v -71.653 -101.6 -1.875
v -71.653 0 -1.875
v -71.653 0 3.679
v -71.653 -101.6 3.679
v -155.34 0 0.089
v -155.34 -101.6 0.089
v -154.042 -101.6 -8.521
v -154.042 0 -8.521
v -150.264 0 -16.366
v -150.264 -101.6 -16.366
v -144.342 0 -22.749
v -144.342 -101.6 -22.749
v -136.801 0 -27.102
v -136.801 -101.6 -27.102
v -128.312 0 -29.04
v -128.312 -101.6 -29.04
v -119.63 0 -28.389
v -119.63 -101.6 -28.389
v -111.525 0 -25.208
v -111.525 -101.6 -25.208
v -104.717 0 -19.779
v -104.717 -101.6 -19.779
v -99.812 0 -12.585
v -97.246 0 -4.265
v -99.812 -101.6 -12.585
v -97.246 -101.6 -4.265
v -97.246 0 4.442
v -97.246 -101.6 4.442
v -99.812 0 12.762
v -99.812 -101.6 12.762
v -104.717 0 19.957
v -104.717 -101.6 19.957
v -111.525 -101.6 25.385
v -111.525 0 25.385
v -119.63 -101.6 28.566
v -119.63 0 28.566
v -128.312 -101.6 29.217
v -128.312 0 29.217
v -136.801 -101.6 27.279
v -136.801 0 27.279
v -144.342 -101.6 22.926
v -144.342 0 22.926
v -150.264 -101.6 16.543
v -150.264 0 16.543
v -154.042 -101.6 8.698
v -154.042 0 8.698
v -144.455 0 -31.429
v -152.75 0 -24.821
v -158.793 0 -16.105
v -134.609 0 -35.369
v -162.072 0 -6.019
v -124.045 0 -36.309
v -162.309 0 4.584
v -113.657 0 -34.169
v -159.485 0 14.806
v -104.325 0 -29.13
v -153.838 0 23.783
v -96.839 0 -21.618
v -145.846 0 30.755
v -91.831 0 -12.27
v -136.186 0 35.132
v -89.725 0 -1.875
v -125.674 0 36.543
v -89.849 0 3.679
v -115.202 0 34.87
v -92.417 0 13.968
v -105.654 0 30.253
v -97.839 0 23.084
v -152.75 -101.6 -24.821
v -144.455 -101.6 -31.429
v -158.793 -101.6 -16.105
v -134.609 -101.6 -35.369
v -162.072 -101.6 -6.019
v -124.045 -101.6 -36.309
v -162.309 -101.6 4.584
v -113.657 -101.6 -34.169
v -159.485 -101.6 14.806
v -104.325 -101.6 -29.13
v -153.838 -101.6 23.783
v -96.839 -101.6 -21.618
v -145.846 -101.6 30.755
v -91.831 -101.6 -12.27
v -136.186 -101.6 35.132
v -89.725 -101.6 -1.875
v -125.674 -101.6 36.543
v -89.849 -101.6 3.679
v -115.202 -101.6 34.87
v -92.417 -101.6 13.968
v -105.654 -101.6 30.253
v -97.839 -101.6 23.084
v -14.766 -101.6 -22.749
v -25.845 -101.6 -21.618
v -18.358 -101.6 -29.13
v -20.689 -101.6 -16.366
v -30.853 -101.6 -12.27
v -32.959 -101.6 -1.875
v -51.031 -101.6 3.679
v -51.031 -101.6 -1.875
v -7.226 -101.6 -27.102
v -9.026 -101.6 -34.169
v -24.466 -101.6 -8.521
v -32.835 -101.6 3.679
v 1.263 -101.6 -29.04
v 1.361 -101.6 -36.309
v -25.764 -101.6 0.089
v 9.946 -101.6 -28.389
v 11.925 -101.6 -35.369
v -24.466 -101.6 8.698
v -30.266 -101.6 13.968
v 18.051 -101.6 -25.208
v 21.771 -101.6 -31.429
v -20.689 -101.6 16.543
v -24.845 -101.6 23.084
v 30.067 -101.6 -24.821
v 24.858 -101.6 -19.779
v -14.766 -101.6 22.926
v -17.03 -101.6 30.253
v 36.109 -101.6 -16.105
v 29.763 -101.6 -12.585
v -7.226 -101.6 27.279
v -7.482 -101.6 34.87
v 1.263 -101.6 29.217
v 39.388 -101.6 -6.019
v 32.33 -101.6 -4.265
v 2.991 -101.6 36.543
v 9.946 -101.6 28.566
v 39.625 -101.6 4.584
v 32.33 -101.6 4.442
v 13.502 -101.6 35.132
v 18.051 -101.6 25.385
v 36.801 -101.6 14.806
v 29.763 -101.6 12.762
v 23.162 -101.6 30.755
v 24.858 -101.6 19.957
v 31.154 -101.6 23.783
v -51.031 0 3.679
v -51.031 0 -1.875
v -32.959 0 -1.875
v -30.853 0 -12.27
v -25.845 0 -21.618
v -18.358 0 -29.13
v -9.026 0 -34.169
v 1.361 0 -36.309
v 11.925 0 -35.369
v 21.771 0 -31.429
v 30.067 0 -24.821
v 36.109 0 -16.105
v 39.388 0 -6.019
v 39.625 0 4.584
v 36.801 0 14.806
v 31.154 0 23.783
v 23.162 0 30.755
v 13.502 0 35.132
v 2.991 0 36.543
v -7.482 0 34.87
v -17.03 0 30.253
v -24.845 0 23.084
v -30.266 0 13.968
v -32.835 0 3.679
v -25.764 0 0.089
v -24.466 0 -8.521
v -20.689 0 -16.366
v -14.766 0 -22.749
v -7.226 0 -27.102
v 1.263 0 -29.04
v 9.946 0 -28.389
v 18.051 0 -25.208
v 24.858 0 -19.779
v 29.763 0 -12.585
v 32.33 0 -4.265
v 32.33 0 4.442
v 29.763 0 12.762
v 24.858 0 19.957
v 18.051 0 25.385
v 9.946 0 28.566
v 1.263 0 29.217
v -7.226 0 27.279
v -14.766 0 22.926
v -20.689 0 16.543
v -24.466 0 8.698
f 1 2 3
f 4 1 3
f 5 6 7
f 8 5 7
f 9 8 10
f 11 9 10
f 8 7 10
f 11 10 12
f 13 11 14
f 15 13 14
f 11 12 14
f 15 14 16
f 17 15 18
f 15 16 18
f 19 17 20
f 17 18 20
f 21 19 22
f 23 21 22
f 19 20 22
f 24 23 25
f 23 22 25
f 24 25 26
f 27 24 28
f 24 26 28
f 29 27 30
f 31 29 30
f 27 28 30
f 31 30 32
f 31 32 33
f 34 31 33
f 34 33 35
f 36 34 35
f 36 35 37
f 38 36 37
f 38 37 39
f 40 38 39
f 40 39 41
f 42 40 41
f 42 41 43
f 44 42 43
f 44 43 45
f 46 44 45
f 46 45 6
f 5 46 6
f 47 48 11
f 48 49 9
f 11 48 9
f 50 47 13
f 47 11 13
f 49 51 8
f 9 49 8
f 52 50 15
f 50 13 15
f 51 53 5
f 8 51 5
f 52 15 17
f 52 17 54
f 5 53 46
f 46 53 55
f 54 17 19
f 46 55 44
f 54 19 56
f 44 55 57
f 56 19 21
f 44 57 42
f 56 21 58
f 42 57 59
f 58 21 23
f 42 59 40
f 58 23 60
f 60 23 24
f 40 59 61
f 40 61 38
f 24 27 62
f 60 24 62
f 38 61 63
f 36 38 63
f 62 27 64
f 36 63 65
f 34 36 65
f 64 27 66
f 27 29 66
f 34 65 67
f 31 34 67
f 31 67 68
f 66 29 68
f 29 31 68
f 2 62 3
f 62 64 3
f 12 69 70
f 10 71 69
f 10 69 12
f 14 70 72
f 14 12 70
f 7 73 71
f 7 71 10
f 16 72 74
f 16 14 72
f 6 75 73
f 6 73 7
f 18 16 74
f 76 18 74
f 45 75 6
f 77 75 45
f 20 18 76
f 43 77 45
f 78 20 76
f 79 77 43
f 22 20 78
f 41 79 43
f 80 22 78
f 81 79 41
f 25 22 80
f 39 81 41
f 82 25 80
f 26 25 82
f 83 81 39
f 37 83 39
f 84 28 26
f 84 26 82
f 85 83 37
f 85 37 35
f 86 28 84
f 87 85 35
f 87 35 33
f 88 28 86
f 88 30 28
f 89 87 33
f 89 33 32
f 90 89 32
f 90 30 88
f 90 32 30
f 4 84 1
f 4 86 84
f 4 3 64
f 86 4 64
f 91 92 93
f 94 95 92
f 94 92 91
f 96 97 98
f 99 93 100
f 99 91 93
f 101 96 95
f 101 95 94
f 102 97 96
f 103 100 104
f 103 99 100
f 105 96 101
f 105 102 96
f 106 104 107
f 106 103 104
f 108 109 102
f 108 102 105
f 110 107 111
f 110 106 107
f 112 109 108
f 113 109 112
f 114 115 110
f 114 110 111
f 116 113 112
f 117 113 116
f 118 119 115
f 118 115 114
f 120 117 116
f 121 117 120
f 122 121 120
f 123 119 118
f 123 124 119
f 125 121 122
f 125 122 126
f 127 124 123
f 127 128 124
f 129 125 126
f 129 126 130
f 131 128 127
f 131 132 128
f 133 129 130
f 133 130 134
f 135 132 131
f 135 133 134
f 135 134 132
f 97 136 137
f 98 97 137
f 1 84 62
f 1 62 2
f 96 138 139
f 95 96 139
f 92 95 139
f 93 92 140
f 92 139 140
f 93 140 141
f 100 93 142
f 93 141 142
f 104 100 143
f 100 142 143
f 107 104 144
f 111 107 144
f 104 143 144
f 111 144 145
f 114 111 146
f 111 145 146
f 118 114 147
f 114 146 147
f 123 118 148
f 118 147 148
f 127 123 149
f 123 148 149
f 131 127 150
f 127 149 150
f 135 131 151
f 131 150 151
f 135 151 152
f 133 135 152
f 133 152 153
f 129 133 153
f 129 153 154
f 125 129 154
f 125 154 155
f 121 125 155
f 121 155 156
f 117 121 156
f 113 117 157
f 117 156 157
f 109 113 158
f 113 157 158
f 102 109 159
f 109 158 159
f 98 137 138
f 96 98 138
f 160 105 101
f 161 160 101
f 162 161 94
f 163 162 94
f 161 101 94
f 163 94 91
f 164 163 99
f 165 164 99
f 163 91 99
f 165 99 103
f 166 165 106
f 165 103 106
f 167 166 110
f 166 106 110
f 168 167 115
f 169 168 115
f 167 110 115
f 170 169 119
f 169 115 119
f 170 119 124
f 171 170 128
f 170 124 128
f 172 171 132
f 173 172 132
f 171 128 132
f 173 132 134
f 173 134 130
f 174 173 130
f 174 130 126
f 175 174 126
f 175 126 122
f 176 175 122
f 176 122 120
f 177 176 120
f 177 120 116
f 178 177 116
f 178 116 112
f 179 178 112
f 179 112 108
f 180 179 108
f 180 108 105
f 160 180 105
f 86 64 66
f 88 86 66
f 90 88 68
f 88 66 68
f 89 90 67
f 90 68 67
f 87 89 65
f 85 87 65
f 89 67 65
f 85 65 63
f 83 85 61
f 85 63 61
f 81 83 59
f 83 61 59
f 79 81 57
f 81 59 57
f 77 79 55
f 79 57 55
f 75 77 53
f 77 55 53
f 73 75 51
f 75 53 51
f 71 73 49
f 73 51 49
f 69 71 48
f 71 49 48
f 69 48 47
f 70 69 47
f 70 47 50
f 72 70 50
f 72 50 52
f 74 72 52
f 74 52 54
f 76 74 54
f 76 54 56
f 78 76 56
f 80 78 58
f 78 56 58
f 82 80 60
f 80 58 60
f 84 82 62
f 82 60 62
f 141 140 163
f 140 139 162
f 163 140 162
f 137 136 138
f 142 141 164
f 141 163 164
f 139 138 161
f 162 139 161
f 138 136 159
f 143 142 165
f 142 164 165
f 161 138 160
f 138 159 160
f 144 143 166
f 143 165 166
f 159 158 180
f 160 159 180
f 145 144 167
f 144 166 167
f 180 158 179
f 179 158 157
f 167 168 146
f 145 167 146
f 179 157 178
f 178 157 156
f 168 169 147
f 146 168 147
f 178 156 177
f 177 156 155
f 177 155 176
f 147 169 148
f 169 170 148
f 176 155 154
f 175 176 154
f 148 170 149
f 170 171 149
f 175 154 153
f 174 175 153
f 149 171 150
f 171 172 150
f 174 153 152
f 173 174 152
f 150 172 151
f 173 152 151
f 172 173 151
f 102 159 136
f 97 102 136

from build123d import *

# Parameters (mm, degrees)
F1_DEPTH = 101.6
F2_D     = 58.42
F3_D     = 58.42


with BuildPart() as f1:
    # F0 (on Front) → F1 (new body)
    with BuildSketch(Plane.XZ):
        with BuildLine():
            ThreePointArc((-32.9588601721, -1.8753951881), (4.4282430341, -36.3557427341), (39.9035067211, 0.0886741137))
            ThreePointArc((39.9035067211, 0.0886741137), (5.2429792671, 36.5020088217), (-32.8346297567, 3.6785599019))
            Line((-32.8346297567, 3.6785599019), (-32.8346297567, -1.8753951881))
            Line((-32.8346297567, -1.8753951881), (-32.9588601721, -1.8753951881))
        make_face()
        with BuildLine():
            Line((-32.8346297567, -1.8753951881), (-32.8346297567, 3.6785599019))
            ThreePointArc((-32.8346297567, 3.6785599019), (-33.0026864957, 0.9039520485), (-32.9588601721, -1.8753951881))
            Line((-32.9588601721, -1.8753951881), (-32.8346297567, -1.8753951881))
        make_face()
        with BuildLine():
            ThreePointArc((-32.9588601721, -1.8753951881), (-33.0026864957, 0.9039520485), (-32.8346297567, 3.6785599019))
            Line((-32.8346297567, 3.6785599019), (-51.0312430561, 3.6785599019))
            Line((-51.0312430561, 3.6785599019), (-51.0312430561, -1.8753951881))
            Line((-51.0312430561, -1.8753951881), (-32.9588601721, -1.8753951881))
        make_face()
    extrude(amount=F1_DEPTH)

    # F2 (through all)
    with Locations(Plane(origin=(0, 0, 0), x_dir=(1, 0, 0), z_dir=(0, 1, 0))):
        with Locations((3.4458516652, -0.0886741137)):
            Hole(F2_D / 2)


with BuildPart() as f1b:
    # F0 (on Front) → F1, piece 2 (new body)
    with BuildSketch(Plane.XZ):
        with BuildLine():
            Line((-71.6525129974, 3.6785599019), (-89.8491262968, 3.6785599019))
            ThreePointArc((-89.8491262968, 3.6785599019), (-89.7162730106, 1.8858017155), (-89.6719526627, 0.0886741137))
            ThreePointArc((-89.6719526627, 0.0886741137), (-89.6851908709, -0.8937172552), (-89.7248958814, -1.8753951881))
            Line((-89.7248958814, -1.8753951881), (-71.6525129974, -1.8753951881))
            Line((-71.6525129974, -1.8753951881), (-71.6525129974, 3.6785599019))
        make_face()
        with BuildLine():
            ThreePointArc((-89.6719526627, 0.0886741137), (-89.7162730106, 1.8858017155), (-89.8491262968, 3.6785599019))
            ThreePointArc((-89.8491262968, 3.6785599019), (-162.5781458795, -0.7266038211), (-89.7248958814, -1.8753951881))
            ThreePointArc((-89.7248958814, -1.8753951881), (-89.6851908709, -0.8937172552), (-89.6719526627, 0.0886741137))
        make_face()
    extrude(amount=F1_DEPTH)

    # F3 (through all)
    with Locations(Plane(origin=(0, 0, 0), x_dir=(1, 0, 0), z_dir=(0, 1, 0))):
        with Locations((-126.1296077187, -0.0886741137)):
            Hole(F3_D / 2)


solid = Compound([f1.part, f1b.part])
